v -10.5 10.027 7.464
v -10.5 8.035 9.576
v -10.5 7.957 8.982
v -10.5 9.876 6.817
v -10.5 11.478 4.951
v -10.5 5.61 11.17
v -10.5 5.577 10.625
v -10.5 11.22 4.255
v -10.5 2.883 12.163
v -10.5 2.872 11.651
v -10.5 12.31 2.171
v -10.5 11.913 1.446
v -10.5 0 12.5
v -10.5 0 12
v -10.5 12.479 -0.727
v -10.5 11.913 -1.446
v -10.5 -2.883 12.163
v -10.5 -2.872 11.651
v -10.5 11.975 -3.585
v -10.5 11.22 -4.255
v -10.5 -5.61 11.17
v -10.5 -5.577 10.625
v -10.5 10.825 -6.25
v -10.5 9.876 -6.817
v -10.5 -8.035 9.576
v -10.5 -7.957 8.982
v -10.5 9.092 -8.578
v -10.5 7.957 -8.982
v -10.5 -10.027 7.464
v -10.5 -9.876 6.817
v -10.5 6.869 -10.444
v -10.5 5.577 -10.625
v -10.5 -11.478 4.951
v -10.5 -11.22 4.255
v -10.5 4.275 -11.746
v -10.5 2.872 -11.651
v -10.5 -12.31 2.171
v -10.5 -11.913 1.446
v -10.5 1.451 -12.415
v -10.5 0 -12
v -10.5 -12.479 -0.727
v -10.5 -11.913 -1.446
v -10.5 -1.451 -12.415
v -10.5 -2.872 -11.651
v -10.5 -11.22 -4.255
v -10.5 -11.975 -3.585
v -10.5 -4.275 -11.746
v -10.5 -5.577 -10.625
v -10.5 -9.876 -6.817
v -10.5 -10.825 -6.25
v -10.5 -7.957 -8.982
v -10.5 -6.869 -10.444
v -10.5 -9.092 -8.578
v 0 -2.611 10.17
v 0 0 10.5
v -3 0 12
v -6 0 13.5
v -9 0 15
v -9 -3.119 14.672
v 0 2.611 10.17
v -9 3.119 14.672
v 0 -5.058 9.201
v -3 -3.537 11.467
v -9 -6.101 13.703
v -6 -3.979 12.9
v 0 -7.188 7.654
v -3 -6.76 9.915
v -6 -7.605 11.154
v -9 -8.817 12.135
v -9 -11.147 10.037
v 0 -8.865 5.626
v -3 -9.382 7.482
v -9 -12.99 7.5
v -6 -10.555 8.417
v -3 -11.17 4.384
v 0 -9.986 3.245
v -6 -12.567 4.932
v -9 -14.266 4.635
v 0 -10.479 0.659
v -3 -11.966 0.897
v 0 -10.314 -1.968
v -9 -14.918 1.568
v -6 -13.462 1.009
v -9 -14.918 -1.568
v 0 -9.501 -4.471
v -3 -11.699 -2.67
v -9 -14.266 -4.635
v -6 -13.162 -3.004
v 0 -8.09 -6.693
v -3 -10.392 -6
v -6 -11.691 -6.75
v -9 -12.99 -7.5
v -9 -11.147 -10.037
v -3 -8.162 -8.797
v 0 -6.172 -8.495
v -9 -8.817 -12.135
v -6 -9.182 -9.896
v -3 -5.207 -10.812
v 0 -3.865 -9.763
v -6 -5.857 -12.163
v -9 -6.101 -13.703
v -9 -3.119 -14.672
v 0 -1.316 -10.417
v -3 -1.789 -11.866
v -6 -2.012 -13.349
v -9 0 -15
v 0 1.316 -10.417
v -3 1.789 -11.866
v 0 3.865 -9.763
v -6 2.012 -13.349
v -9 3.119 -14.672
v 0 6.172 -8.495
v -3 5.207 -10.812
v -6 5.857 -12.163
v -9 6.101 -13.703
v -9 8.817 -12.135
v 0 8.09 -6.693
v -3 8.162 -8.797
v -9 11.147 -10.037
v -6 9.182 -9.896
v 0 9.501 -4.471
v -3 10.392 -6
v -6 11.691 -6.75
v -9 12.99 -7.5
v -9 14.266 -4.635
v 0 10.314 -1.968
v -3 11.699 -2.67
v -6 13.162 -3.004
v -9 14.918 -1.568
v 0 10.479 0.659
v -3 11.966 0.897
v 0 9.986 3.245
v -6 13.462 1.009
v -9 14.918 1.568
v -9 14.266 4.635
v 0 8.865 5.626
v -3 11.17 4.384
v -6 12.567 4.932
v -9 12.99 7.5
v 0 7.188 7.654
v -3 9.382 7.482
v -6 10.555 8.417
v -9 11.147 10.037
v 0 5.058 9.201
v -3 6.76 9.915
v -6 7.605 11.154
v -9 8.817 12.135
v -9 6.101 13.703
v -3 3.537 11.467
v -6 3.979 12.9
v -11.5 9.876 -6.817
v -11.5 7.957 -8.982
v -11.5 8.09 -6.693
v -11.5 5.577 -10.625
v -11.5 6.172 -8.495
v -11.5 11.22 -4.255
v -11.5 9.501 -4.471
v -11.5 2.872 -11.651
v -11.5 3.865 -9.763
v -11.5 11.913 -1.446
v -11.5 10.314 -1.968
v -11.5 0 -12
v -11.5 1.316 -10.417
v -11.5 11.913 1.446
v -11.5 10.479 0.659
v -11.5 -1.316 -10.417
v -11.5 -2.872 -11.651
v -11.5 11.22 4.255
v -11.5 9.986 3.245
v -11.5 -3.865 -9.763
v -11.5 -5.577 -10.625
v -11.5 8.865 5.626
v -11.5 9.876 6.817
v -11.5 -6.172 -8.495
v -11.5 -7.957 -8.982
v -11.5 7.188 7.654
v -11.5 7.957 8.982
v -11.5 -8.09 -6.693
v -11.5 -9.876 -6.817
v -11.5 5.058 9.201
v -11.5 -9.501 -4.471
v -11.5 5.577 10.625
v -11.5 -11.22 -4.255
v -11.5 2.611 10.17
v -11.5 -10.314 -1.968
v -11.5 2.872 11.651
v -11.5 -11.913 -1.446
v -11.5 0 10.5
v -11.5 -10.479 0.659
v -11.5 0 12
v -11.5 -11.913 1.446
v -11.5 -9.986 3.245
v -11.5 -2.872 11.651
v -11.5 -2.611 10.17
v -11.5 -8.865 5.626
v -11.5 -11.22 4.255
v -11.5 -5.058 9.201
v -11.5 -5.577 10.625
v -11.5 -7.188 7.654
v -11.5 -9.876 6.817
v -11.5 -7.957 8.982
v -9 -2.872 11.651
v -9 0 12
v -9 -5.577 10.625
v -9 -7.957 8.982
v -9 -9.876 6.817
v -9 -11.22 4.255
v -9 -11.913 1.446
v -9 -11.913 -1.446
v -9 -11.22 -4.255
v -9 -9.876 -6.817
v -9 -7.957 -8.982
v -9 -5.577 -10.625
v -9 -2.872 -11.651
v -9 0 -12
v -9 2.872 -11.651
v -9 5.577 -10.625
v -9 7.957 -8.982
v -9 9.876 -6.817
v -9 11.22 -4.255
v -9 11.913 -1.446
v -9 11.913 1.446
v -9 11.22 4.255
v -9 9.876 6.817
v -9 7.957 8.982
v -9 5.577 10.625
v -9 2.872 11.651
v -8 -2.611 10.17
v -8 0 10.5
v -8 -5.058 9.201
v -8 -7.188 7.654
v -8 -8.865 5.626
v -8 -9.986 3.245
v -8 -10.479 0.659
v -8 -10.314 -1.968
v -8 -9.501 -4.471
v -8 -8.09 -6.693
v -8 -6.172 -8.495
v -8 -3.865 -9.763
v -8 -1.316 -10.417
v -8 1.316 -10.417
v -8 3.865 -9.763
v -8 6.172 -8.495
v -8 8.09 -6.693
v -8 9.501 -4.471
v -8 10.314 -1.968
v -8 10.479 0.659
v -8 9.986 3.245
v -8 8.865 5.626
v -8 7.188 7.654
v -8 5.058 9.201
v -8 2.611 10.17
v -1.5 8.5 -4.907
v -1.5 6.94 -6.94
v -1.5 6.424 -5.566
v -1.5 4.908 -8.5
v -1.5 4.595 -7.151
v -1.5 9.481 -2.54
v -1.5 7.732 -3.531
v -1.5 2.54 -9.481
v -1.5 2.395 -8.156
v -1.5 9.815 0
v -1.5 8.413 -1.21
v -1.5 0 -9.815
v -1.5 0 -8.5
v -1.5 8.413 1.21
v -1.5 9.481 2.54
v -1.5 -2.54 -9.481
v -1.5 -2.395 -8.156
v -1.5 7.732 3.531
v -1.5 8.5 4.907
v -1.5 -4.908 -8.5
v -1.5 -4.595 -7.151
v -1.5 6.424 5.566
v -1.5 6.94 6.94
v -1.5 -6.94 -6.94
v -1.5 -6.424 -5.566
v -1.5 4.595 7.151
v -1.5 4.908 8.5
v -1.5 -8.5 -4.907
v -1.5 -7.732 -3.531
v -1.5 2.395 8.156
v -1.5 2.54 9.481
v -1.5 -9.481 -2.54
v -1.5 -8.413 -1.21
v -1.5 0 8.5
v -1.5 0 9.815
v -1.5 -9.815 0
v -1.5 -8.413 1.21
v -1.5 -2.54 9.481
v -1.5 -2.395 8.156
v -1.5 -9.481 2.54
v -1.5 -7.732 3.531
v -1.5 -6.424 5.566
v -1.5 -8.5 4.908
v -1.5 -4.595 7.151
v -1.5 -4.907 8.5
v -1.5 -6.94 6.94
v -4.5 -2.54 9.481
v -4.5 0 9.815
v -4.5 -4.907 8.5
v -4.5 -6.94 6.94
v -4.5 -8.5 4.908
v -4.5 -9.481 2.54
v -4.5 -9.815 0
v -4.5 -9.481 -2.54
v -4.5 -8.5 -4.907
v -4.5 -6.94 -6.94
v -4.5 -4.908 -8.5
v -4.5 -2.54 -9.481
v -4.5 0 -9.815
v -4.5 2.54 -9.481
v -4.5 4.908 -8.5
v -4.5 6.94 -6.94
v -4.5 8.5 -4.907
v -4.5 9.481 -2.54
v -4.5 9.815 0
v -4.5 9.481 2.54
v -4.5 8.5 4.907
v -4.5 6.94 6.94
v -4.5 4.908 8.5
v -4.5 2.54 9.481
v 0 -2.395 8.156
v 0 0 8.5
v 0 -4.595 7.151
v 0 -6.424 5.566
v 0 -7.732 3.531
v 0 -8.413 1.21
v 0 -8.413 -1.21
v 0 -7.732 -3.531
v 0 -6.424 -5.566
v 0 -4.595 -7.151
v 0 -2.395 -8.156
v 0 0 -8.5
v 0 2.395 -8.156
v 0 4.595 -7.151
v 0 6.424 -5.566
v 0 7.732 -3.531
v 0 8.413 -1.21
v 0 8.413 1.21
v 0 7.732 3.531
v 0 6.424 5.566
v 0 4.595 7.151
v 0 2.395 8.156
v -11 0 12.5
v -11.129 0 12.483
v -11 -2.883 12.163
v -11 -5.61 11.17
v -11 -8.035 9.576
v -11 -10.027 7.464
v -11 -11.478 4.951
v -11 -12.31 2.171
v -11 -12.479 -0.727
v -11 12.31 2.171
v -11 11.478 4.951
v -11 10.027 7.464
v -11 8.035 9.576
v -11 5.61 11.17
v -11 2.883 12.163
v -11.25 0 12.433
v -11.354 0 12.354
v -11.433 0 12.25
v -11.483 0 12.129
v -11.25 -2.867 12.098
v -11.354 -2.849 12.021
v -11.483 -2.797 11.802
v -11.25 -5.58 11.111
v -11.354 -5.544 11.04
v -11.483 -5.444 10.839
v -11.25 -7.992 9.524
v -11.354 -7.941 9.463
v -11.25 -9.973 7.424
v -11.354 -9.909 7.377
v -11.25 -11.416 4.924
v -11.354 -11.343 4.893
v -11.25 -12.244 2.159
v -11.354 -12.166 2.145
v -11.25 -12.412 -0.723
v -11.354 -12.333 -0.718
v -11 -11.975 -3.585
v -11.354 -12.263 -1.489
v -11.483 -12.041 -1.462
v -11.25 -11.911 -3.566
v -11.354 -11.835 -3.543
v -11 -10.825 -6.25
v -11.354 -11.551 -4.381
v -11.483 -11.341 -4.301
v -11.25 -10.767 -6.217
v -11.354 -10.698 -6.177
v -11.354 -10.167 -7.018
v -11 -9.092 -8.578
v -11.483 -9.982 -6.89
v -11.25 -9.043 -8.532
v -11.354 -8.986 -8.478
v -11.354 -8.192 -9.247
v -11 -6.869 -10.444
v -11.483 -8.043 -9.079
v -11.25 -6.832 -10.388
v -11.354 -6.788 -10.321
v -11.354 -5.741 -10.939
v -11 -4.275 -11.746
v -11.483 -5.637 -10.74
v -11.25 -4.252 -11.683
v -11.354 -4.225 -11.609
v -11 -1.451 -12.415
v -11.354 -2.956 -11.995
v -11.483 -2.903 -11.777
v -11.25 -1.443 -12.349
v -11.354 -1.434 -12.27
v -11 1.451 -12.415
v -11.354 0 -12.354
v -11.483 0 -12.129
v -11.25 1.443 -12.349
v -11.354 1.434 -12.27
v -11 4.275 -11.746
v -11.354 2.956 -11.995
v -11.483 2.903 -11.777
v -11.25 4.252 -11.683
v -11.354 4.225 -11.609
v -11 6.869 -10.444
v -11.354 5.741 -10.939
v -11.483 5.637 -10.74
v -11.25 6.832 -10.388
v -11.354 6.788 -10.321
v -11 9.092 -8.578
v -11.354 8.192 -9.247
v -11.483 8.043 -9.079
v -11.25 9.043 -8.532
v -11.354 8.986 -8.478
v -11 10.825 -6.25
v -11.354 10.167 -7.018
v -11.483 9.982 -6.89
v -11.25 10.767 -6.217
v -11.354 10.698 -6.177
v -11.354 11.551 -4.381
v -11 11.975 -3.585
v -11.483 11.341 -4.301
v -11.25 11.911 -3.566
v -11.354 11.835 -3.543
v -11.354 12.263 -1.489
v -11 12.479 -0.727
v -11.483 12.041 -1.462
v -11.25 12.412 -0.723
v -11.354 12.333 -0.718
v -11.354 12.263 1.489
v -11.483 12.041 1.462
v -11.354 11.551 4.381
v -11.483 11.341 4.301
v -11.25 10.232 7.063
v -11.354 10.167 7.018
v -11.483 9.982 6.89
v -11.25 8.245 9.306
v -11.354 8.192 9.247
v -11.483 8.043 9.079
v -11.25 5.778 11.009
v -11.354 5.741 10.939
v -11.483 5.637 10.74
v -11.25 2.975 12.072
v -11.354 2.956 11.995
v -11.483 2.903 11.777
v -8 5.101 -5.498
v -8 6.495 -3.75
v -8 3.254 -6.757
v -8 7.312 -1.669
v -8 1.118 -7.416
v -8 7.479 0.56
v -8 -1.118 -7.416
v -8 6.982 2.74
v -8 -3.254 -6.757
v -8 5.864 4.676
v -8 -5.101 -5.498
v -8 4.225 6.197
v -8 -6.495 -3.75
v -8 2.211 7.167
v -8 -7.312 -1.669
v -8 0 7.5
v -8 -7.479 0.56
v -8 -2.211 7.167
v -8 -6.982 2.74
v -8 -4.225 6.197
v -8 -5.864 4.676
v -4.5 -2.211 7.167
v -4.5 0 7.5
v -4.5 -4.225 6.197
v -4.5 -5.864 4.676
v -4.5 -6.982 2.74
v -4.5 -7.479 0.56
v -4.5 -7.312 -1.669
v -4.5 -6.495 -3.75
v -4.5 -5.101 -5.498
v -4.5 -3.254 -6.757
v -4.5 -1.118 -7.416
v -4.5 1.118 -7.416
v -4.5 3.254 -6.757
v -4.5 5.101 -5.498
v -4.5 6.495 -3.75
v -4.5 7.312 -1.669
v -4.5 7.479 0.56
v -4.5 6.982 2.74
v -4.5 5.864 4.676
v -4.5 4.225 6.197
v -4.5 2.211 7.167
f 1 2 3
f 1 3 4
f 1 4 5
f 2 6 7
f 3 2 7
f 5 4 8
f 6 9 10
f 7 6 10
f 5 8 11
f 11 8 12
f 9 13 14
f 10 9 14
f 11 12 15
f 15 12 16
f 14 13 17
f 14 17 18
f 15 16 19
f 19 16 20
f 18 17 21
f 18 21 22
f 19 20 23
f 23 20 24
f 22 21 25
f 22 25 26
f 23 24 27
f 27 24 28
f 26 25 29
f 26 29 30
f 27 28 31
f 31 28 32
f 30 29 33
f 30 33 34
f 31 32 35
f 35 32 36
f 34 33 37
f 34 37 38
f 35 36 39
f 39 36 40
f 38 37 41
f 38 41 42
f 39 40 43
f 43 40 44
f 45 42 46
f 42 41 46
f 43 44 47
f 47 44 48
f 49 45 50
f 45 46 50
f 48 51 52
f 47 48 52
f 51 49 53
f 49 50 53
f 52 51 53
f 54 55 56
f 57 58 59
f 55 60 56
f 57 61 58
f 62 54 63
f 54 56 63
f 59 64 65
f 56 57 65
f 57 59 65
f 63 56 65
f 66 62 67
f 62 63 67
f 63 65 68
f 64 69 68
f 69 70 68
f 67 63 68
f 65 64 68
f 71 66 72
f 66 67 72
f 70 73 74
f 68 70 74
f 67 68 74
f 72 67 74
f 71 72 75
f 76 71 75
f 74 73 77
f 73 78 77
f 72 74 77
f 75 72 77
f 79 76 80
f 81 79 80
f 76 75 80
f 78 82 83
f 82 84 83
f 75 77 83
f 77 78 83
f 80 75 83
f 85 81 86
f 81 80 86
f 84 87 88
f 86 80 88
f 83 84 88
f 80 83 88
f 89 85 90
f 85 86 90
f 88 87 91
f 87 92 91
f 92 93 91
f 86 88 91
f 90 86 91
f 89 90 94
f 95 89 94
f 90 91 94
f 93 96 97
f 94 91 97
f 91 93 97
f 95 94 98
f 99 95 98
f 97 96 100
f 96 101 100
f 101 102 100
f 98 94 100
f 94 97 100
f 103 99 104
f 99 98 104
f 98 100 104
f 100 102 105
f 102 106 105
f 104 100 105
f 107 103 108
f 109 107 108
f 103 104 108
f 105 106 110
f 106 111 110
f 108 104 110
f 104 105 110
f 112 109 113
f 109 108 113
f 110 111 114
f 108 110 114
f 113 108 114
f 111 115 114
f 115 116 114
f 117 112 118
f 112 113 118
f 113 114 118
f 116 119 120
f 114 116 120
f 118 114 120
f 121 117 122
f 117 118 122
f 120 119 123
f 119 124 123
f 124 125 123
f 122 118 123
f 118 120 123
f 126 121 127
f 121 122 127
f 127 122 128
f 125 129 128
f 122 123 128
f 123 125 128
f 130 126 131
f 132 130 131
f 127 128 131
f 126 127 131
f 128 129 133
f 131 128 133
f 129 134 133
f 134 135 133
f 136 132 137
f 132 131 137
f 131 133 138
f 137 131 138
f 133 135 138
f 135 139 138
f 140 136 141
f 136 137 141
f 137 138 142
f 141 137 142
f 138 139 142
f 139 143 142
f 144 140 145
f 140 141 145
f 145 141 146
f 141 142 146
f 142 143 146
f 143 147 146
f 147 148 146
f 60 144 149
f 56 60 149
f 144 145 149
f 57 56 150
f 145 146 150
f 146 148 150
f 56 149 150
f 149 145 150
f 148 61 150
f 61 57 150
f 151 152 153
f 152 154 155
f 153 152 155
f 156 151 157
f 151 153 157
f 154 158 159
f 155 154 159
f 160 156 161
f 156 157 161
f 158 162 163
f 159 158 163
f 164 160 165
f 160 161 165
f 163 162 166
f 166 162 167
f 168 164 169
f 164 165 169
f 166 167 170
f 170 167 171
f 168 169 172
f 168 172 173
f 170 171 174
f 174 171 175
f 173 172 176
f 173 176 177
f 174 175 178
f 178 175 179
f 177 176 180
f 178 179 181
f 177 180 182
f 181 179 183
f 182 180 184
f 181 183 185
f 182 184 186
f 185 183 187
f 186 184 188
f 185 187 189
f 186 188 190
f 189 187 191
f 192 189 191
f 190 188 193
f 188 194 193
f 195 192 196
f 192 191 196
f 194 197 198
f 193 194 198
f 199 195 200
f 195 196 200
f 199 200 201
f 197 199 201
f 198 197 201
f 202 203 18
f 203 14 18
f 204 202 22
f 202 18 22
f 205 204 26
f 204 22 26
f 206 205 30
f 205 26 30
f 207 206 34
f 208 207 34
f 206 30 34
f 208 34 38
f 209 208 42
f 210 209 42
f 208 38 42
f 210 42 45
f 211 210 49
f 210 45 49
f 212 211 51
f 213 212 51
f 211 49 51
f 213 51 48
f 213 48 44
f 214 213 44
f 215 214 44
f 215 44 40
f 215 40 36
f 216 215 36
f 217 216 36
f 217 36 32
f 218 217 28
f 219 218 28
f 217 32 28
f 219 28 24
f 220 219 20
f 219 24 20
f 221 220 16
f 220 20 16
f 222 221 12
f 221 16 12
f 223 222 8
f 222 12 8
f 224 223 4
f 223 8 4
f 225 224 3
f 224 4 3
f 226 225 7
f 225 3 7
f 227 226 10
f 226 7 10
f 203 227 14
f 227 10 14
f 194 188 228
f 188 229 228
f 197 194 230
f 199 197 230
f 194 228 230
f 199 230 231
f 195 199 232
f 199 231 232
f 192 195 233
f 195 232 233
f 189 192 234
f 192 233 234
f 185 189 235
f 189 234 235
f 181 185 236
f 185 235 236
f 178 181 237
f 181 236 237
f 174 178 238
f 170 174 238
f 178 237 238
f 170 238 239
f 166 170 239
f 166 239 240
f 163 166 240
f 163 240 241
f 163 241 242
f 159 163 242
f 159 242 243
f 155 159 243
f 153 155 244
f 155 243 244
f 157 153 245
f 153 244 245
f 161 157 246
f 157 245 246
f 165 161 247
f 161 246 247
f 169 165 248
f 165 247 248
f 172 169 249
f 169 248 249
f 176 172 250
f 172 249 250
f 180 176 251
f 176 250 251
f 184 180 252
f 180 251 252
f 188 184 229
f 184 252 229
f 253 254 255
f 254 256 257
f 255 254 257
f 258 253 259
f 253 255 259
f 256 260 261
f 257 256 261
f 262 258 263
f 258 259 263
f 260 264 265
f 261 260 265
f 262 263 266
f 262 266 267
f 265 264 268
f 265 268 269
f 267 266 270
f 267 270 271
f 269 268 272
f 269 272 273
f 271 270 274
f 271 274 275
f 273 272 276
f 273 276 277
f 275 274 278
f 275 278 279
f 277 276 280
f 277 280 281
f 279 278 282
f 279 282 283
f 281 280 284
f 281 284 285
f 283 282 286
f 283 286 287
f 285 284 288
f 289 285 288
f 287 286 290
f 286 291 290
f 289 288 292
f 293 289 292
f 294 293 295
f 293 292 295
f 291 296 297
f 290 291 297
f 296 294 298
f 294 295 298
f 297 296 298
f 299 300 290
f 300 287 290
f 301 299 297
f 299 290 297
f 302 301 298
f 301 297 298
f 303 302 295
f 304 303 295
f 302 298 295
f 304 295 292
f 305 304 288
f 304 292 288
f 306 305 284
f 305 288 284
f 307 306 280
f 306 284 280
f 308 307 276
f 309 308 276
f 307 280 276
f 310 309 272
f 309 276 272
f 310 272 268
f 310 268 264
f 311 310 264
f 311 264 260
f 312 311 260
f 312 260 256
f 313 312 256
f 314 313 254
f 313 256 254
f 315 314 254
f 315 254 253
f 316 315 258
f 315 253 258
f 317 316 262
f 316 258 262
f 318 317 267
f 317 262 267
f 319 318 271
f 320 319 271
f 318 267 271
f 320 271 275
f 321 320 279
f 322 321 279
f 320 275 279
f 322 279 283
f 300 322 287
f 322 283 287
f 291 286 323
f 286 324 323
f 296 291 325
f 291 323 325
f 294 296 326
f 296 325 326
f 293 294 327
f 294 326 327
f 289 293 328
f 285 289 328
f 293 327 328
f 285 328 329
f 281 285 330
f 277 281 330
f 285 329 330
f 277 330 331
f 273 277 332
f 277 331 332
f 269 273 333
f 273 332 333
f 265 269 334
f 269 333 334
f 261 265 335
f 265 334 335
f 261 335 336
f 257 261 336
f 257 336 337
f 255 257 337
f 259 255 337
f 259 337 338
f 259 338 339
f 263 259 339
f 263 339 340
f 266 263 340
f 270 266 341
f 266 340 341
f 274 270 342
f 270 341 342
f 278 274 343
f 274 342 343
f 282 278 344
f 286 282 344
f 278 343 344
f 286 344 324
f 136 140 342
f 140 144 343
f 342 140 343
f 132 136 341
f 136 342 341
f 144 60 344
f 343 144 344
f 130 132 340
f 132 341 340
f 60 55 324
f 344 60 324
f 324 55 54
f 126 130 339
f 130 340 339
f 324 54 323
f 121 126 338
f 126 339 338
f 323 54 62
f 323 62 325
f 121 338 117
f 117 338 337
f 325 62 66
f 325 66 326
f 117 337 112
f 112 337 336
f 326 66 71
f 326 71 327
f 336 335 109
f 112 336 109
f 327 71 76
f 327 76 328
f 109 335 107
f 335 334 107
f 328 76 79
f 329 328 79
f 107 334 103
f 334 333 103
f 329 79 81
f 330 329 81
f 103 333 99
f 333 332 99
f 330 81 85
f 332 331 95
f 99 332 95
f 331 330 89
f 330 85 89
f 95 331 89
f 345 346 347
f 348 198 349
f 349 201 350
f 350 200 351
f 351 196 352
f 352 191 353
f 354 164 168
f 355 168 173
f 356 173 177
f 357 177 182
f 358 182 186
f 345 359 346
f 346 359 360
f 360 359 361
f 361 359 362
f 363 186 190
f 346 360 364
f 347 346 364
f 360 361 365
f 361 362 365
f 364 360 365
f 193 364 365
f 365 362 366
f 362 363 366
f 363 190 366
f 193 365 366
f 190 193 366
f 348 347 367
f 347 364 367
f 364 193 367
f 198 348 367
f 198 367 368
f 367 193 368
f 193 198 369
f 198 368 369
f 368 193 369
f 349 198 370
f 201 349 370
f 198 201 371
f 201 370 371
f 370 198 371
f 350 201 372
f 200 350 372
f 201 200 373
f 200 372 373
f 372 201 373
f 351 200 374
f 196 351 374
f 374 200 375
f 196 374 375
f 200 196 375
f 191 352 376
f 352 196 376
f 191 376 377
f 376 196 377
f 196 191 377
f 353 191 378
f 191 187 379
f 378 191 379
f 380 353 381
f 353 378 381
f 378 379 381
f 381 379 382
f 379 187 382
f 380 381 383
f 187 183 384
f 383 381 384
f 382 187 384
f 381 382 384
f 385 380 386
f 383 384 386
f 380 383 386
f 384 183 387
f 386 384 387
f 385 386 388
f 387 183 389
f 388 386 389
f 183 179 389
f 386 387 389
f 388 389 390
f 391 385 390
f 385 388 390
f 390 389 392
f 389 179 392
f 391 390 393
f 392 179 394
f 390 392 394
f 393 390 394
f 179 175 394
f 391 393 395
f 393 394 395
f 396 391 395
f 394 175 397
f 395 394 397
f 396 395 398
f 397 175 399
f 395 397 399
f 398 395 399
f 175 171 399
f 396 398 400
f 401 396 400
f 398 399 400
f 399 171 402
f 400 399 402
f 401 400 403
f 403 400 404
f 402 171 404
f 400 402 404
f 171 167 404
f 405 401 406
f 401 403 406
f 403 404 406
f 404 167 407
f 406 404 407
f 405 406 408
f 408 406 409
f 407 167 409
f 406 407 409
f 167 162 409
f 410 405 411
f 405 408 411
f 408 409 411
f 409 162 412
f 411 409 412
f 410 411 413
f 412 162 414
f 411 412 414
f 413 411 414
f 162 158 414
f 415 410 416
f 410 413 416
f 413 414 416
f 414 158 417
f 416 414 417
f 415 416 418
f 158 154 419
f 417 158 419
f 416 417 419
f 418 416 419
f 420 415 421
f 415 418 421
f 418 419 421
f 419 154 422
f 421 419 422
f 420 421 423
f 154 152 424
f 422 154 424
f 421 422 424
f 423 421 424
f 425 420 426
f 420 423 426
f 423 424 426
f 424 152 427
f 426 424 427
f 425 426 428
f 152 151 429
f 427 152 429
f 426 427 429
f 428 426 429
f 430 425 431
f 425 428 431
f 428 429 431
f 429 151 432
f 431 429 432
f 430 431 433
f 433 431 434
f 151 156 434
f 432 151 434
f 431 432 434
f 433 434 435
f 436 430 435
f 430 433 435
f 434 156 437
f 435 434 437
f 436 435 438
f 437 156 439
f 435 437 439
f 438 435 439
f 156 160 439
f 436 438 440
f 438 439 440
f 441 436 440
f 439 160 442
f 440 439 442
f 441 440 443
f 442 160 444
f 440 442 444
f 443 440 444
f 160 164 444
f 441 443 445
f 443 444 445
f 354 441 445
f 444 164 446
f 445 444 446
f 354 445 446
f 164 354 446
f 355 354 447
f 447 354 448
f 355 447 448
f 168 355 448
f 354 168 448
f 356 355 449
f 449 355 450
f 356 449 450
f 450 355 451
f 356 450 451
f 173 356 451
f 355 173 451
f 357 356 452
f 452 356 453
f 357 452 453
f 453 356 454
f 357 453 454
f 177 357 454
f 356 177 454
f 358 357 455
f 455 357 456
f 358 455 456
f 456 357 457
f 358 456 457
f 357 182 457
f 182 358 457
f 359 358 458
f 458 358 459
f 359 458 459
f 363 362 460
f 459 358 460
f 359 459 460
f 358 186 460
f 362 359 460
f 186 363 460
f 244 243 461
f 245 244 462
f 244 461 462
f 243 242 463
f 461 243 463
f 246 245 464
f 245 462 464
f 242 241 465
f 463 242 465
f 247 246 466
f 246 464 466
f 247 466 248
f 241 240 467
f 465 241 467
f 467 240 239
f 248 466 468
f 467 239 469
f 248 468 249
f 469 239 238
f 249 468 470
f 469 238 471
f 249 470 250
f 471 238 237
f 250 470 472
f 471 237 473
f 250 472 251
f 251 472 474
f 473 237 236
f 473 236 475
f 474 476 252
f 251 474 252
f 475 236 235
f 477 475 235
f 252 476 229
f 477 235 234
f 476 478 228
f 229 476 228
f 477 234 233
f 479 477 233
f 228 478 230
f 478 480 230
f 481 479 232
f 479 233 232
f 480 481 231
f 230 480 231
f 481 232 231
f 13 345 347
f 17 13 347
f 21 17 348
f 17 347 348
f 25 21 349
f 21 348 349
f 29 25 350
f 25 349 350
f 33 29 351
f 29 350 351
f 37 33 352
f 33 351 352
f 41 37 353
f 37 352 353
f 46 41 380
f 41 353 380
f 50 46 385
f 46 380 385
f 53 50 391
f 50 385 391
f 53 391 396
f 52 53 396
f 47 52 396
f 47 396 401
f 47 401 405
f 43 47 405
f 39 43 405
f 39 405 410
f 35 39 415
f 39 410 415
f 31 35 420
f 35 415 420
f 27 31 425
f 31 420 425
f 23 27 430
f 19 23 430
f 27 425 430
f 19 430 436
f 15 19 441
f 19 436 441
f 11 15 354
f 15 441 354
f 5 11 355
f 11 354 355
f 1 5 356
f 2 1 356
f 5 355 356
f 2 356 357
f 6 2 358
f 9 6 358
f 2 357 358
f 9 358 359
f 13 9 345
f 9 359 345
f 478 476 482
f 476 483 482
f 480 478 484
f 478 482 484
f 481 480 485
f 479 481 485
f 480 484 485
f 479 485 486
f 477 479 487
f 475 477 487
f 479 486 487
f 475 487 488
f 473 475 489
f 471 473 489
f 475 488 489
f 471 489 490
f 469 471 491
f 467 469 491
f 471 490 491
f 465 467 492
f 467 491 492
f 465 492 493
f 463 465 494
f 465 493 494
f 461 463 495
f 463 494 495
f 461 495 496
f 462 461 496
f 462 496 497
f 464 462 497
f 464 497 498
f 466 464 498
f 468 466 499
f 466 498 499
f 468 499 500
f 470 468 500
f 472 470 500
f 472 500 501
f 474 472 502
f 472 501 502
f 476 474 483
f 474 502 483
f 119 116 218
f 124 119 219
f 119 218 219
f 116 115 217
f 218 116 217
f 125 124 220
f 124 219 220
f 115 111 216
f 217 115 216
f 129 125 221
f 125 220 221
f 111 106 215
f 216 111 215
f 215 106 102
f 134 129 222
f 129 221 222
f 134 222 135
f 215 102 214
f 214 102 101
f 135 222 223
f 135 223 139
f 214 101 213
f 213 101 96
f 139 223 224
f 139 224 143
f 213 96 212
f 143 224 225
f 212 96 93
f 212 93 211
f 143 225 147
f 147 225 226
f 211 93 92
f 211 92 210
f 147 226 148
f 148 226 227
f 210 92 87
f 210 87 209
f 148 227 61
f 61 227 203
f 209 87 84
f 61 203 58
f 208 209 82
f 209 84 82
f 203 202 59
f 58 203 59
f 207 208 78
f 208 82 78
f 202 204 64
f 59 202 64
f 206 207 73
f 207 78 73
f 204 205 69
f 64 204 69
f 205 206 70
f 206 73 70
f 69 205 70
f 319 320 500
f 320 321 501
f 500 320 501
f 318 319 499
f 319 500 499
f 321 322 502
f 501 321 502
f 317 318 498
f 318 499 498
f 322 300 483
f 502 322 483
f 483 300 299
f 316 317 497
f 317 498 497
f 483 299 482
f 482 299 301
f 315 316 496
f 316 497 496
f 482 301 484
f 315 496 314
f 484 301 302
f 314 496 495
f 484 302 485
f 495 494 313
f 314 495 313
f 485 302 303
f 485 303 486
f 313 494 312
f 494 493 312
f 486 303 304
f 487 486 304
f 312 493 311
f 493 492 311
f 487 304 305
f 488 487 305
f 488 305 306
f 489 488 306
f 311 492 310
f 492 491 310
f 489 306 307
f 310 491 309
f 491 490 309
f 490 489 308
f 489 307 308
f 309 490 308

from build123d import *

# Parameters (mm, degrees)
CONG_1_R = 0.5


with BuildPart() as part:
    # Esquisse1 → Révolution1 (revolve)
    with BuildSketch(Plane.XY, mode=Mode.PRIVATE) as r_volution1_sk:
        Polygon((-8, 7.5), (-4.5, 7.5), (-4.5, 9.815), (-1.5, 9.815), (-1.5, 8.5), (0, 8.5), (0, 10.5), (-9, 15), (-9, 12), (-10.5, 12), (-10.5, 12.5), (-11.5, 12.5), (-11.5, 10.5), (-8, 10.5), align=None)
    revolve(r_volution1_sk.sketch.rotate(Axis((-27.606261023, 0, 0), (1, 0, 0)), 90), axis=Axis((-27.606261023, 0, 0), (1, 0, 0)))  # turned: the seam where the file's is

    # Congé1
    cong_1_edges = [part.edges().sort_by_distance(p)[0] for p in [
        (-11.5, 0, -12.5),
    ]]
    fillet(cong_1_edges, radius=CONG_1_R)


solid = part.part
